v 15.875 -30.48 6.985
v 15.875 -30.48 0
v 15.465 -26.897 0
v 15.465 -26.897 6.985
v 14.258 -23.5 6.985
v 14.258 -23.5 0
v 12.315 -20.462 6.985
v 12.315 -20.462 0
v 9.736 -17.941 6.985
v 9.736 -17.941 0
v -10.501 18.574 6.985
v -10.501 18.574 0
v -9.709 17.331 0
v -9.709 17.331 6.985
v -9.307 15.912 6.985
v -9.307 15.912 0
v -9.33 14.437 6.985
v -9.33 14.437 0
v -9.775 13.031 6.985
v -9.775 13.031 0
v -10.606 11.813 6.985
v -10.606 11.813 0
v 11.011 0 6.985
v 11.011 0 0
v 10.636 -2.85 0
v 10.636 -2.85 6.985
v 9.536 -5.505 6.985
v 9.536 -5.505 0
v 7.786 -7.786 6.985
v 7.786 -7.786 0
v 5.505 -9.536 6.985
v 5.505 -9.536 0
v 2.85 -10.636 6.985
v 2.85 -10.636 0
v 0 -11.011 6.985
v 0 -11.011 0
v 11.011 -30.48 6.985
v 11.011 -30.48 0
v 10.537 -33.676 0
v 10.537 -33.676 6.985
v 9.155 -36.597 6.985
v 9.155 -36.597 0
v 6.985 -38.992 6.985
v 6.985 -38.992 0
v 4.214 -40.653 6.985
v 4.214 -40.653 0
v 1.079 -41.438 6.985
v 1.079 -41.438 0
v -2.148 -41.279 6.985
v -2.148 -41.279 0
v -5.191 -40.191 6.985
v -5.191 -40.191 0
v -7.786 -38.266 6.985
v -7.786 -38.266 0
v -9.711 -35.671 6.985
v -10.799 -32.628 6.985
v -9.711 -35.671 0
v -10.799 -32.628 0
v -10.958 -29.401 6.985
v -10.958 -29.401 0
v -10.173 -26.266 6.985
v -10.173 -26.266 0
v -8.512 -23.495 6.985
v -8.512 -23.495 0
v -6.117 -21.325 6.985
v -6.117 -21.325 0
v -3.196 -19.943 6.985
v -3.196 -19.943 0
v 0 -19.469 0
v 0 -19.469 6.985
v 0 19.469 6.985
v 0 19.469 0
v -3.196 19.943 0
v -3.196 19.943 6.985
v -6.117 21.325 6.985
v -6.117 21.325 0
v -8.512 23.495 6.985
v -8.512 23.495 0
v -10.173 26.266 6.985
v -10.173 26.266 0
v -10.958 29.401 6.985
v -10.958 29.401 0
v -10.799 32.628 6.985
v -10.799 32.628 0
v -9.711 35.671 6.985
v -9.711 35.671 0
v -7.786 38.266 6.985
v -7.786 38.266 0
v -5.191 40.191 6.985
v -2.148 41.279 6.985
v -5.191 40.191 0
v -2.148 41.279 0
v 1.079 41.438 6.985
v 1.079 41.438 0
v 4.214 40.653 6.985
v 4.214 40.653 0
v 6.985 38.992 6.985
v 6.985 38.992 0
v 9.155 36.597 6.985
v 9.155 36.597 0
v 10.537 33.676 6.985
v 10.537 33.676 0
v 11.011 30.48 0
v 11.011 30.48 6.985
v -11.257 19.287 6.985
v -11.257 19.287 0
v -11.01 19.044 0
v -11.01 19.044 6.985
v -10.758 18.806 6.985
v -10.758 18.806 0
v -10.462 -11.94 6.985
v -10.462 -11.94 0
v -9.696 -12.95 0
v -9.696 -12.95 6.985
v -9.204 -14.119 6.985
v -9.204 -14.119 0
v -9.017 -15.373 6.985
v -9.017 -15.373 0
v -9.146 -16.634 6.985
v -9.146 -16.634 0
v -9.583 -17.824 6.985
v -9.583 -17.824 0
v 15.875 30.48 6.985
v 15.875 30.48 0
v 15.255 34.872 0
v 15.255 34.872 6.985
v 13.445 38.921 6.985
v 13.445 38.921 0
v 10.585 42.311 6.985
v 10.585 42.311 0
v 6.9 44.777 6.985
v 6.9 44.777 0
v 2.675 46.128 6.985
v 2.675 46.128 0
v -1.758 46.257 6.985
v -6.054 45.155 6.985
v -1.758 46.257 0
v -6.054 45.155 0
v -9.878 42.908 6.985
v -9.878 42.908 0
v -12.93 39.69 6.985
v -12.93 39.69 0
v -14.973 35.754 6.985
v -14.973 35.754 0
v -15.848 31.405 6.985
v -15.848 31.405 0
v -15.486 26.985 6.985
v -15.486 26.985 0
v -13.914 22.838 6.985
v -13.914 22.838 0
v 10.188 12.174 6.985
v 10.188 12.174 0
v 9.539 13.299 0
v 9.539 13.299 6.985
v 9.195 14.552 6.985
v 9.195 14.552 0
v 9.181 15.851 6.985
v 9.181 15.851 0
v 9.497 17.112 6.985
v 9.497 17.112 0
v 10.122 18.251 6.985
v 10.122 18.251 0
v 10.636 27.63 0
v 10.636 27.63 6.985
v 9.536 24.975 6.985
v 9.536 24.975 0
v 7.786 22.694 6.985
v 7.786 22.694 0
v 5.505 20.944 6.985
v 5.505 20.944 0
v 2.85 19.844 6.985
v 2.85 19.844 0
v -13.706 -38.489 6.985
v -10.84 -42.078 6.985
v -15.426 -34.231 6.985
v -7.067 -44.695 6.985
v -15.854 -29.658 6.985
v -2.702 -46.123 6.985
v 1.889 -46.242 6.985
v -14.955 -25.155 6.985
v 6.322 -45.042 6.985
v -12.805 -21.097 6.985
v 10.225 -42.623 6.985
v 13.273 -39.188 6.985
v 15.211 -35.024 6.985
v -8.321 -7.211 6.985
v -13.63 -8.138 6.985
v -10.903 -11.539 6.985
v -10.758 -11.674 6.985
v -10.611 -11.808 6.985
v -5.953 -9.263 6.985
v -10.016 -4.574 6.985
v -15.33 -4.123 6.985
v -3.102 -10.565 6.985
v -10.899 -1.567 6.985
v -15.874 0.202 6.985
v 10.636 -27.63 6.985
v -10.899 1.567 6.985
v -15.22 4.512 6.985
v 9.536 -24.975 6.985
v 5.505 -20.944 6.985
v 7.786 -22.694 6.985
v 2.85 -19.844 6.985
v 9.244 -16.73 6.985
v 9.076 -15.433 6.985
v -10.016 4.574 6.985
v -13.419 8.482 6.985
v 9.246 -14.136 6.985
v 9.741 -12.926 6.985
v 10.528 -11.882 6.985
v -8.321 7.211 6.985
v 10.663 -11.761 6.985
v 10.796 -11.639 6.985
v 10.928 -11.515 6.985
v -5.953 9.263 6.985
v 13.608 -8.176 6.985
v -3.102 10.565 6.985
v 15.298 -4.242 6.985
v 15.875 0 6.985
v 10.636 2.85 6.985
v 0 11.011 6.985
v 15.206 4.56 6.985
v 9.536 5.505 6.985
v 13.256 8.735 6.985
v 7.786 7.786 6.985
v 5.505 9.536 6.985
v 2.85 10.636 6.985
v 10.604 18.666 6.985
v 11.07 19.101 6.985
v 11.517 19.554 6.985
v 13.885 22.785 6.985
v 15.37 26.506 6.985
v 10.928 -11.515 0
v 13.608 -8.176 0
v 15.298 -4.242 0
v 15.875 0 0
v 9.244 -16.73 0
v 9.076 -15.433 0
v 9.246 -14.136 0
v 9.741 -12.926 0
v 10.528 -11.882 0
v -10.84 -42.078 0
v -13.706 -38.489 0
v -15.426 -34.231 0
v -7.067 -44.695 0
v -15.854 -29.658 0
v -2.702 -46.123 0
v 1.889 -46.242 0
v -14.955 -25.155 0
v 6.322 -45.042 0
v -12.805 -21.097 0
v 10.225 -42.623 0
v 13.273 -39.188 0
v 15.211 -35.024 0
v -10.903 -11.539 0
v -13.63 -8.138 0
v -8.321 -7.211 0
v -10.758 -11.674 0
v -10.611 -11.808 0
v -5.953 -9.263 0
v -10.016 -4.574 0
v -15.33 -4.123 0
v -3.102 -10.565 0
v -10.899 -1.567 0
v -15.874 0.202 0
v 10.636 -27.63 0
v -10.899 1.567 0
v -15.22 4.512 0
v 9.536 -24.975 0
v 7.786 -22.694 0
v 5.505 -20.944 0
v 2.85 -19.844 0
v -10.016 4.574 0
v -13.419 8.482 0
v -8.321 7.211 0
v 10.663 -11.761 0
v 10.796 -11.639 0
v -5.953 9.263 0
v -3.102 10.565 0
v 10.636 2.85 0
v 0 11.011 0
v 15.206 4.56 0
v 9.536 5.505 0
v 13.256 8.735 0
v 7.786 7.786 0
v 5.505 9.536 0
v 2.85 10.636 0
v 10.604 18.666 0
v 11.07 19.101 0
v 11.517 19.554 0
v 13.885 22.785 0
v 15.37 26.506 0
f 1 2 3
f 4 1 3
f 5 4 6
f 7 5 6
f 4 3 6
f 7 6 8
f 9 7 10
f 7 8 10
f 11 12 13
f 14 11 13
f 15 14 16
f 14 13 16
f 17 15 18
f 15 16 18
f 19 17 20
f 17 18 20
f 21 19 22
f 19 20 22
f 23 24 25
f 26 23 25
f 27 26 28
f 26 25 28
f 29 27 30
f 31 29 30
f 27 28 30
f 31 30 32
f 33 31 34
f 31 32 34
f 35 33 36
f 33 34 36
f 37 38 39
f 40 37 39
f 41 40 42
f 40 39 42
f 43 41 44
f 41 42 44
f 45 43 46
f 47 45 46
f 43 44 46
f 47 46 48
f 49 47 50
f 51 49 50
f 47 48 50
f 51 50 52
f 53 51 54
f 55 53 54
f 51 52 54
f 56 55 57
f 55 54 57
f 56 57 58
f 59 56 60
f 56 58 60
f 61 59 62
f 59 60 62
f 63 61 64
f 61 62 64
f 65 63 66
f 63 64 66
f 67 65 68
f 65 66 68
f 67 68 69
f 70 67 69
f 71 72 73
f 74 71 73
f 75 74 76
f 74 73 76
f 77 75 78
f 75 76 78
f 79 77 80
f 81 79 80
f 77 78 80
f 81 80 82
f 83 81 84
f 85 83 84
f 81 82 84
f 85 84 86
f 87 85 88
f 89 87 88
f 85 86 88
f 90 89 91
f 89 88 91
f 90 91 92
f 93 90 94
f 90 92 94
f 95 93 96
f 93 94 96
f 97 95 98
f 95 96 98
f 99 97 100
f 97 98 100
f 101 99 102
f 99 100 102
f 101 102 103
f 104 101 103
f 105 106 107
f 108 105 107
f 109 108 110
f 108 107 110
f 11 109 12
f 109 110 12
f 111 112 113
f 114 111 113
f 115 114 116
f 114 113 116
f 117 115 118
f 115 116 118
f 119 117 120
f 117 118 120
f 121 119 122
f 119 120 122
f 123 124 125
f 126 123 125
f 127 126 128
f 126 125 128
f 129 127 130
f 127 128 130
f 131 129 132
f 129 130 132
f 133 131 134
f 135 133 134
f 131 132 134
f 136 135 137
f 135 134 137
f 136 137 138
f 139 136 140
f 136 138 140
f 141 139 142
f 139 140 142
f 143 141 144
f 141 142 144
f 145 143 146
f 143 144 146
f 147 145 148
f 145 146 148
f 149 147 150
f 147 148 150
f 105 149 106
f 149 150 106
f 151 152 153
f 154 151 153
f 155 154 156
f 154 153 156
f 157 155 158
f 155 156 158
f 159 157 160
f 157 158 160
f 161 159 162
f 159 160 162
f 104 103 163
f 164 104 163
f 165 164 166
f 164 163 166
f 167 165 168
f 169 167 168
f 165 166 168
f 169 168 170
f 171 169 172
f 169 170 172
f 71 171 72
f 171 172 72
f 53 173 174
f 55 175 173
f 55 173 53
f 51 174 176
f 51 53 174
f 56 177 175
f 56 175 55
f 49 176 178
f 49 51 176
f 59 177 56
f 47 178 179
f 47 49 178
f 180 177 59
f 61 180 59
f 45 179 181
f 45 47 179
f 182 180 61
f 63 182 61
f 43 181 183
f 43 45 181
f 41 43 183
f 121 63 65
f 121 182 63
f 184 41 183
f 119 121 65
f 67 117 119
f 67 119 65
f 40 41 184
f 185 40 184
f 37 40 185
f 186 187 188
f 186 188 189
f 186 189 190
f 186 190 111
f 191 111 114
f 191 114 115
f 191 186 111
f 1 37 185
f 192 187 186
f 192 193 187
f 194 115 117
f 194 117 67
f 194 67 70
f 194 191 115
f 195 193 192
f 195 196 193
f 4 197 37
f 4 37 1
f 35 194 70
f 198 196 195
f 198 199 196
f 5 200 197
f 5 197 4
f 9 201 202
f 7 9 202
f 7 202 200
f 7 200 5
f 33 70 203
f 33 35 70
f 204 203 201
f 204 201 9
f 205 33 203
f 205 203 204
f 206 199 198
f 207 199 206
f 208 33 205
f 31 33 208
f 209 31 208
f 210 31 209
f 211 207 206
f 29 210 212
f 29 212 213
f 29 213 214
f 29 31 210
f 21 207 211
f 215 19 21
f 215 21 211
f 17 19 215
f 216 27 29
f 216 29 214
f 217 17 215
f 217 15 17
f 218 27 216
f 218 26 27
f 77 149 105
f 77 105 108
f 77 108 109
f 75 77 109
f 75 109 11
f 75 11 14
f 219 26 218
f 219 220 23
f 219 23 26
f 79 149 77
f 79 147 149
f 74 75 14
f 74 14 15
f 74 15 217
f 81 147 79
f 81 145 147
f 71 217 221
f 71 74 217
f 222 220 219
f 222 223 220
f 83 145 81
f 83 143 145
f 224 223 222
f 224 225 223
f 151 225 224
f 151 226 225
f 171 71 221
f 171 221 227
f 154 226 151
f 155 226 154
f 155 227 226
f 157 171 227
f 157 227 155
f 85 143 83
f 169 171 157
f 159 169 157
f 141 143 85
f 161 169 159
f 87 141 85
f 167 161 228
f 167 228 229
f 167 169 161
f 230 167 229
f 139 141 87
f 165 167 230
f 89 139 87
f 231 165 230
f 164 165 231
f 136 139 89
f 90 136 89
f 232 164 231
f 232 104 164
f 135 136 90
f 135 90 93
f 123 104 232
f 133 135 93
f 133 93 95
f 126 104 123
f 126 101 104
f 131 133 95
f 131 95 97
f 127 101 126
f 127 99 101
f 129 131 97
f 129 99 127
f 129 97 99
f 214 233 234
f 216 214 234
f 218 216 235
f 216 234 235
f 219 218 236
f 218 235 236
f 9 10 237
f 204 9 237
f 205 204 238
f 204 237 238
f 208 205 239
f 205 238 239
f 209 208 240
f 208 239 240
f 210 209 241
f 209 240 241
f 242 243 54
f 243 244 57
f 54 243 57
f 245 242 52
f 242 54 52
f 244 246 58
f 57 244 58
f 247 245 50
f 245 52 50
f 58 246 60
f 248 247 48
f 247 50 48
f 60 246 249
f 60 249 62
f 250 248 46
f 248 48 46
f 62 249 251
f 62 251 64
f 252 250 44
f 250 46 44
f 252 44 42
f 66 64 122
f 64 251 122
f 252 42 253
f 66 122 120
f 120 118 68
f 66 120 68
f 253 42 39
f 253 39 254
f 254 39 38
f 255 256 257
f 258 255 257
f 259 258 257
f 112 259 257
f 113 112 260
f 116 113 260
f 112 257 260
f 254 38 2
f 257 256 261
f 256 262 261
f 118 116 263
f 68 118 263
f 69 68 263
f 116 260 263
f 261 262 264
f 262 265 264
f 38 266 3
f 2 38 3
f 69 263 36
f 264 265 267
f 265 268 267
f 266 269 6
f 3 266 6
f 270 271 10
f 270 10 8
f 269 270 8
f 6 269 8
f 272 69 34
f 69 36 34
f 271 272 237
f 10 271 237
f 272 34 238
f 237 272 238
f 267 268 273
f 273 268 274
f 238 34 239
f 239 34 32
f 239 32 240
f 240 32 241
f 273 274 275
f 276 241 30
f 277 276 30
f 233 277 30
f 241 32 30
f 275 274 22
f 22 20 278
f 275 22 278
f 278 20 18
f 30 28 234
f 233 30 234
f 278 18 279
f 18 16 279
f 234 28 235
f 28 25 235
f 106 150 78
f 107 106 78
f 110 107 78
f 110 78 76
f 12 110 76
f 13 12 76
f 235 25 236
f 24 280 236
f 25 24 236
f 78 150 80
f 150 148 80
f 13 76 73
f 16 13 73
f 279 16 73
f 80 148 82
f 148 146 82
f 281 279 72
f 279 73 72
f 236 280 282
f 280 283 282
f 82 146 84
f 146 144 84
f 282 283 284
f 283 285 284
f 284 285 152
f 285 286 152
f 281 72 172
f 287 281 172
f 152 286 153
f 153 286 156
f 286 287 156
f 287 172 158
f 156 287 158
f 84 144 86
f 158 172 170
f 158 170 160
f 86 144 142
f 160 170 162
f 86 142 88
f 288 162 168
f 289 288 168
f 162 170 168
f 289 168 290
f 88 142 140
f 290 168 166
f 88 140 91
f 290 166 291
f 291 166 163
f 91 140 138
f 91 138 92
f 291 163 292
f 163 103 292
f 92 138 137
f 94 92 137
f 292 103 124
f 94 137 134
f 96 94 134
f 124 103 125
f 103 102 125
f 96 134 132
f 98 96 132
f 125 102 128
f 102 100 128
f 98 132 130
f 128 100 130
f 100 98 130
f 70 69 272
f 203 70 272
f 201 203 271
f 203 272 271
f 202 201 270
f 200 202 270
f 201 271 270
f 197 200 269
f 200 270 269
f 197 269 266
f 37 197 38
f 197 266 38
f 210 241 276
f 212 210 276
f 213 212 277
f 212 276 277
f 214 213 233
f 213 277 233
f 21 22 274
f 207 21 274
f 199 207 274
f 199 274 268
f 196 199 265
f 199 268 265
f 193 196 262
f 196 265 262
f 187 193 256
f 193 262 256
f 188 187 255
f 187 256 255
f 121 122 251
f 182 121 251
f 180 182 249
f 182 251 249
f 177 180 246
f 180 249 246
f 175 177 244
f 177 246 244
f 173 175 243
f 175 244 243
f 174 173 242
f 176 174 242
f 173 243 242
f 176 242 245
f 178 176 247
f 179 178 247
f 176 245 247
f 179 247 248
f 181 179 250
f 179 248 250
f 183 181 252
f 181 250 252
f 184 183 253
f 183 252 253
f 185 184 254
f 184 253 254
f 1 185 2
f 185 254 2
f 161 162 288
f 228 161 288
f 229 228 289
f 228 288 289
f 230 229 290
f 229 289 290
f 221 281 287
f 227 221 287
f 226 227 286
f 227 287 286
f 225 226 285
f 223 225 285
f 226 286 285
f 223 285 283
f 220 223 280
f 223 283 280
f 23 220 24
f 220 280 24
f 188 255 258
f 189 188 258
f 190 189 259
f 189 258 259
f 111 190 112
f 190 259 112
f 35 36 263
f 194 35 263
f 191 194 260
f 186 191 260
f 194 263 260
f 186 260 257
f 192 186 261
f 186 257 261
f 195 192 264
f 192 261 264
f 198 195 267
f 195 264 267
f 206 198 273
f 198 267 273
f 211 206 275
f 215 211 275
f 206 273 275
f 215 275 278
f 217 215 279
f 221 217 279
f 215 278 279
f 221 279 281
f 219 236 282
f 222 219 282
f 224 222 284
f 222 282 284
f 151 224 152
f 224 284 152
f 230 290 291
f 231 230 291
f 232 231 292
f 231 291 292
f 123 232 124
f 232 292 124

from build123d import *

# Parameters (mm, degrees)
F1_DEPTH = 6.985
F2_DEPTH = 6.985


with BuildPart() as f1:
    # F0 (on Top) → F1 (new body)
    with BuildSketch(Plane.XY):
        with BuildLine():
            Line((0, 15.875), (0, 14.605))
            ThreePointArc((0, 14.605), (2.2450640303, 14.7645517881), (4.445, 15.24))
            ThreePointArc((4.445, 15.24), (2.2450640303, 15.7154482119), (0, 15.875))
        make_face()
        with BuildLine():
            ThreePointArc((-4.445, 15.24), (-2.2450640303, 14.7645517881), (0, 14.605))
            Line((0, 14.605), (0, 15.875))
            ThreePointArc((0, 15.875), (-2.2450640303, 15.7154482119), (-4.445, 15.24))
        make_face()
        with BuildLine():
            Line((0, -15.875), (0, -14.605))
            ThreePointArc((0, -14.605), (-2.2450640303, -14.7645517881), (-4.445, -15.24))
            ThreePointArc((-4.445, -15.24), (-2.2450640303, -15.7154482119), (0, -15.875))
        make_face()
        with BuildLine():
            ThreePointArc((4.445, -15.24), (2.2450640303, -14.7645517881), (0, -14.605))
            Line((0, -14.605), (0, -15.875))
            ThreePointArc((0, -15.875), (2.2450640303, -15.7154482119), (4.445, -15.24))
        make_face()
        with BuildLine():
            ThreePointArc((0, -11.0109), (-11.0109, 0), (0, 11.0109))
            Line((0, 11.0109), (0, 14.605))
            ThreePointArc((0, 14.605), (-2.2450640303, 14.7645517881), (-4.445, 15.24))
            ThreePointArc((-4.445, 15.24), (-7.7179285658, 13.8726062315), (-10.6055411699, 11.8126255123))
            ThreePointArc((-10.6055411699, 11.8126255123), (-15.8737141087, 0.2020529542), (-10.9027768874, -11.5388509455))
            ThreePointArc((-10.9027768874, -11.5388509455), (-10.6764801033, -11.7329434022), (-10.4619588639, -11.9399766219))
            ThreePointArc((-10.4619588639, -11.9399766219), (-7.6339304566, -13.919006099), (-4.445, -15.24))
            ThreePointArc((-4.445, -15.24), (-2.2450640303, -14.7645517881), (0, -14.605))
            Line((0, -14.605), (0, -11.0109))
        make_face()
        with BuildLine():
            ThreePointArc((0, 11.0109), (7.785882057, 7.785882057), (11.0109, 0))
            ThreePointArc((11.0109, 0), (7.785882057, -7.785882057), (0, -11.0109))
            Line((0, -11.0109), (0, -14.605))
            ThreePointArc((0, -14.605), (2.2450640303, -14.7645517881), (4.445, -15.24))
            ThreePointArc((4.445, -15.24), (7.6725040661, -13.897780627), (10.5280263251, -11.8817627774))
            ThreePointArc((10.5280263251, -11.8817627774), (10.7229578197, -11.6931817512), (10.9276762517, -11.5152731942))
            ThreePointArc((10.9276762517, -11.5152731942), (14.5858233483, -6.2665287242), (15.875, 0))
            ThreePointArc((15.875, 0), (14.3832859591, 6.7183859683), (10.188485352, 12.1741690161))
            ThreePointArc((10.188485352, 12.1741690161), (7.4755971863, 14.0046803501), (4.445, 15.24))
            ThreePointArc((4.445, 15.24), (2.2450640303, 14.7645517881), (0, 14.605))
            Line((0, 14.605), (0, 11.0109))
        make_face()
        with BuildLine():
            ThreePointArc((4.445, -15.24), (2.2450640303, -15.7154482119), (0, -15.875))
            ThreePointArc((0, -15.875), (-2.2450640303, -15.7154482119), (-4.445, -15.24))
            ThreePointArc((-4.445, -15.24), (-7.1320670392, -16.2972906415), (-9.5831624007, -17.823830619))
            ThreePointArc((-9.5831624007, -17.823830619), (-7.0669272633, -44.6952792465), (15.875, -30.48))
            ThreePointArc((15.875, -30.48), (14.2580065027, -23.4996794079), (9.7364329992, -17.9413598245))
            ThreePointArc((9.7364329992, -17.9413598245), (7.2182128469, -16.3409396247), (4.445, -15.24))
        make_face()
        with BuildLine():
            ThreePointArc((11.0109, -30.48), (-7.785882057, -38.265882057), (0, -19.4691))
            ThreePointArc((0, -19.4691), (7.785882057, -22.694117943), (11.0109, -30.48))
        make_face(mode=Mode.SUBTRACT)
        with BuildLine():
            ThreePointArc((-4.445, 15.24), (-2.2450640303, 15.7154482119), (0, 15.875))
            ThreePointArc((0, 15.875), (2.2450640303, 15.7154482119), (4.445, 15.24))
            ThreePointArc((4.445, 15.24), (7.4374400281, 16.4550183306), (10.1220432287, 18.2505328867))
            ThreePointArc((10.1220432287, 18.2505328867), (10.7577127256, 18.9684394589), (11.5169632943, 19.5541050033))
            ThreePointArc((11.5169632943, 19.5541050033), (14.7452944578, 24.5985107029), (15.875, 30.48))
            ThreePointArc((15.875, 30.48), (-6.0542794063, 45.1551942362), (-11.2571355427, 19.2865856695))
            ThreePointArc((-11.2571355427, 19.2865856695), (-10.8608812375, 18.9498902987), (-10.5011212887, 18.574451853))
            ThreePointArc((-10.5011212887, 18.574451853), (-7.6567798508, 16.5735501541), (-4.445, 15.24))
        make_face()
        with BuildLine():
            ThreePointArc((11.0109, 30.48), (7.785882057, 22.694117943), (0, 19.4691))
            ThreePointArc((0, 19.4691), (-7.785882057, 38.265882057), (11.0109, 30.48))
        make_face(mode=Mode.SUBTRACT)
    extrude(amount=F1_DEPTH)

    # F0 (on Top) → F2 (join)
    with BuildSketch(Plane.XY):
        with BuildLine():
            ThreePointArc((0, 11.0109), (7.785882057, 7.785882057), (11.0109, 0))
            ThreePointArc((11.0109, 0), (7.785882057, -7.785882057), (0, -11.0109))
            Line((0, -11.0109), (0, -14.605))
            ThreePointArc((0, -14.605), (2.2450640303, -14.7645517881), (4.445, -15.24))
            ThreePointArc((4.445, -15.24), (7.6725040661, -13.897780627), (10.5280263251, -11.8817627774))
            ThreePointArc((10.5280263251, -11.8817627774), (10.7229578197, -11.6931817512), (10.9276762517, -11.5152731942))
            ThreePointArc((10.9276762517, -11.5152731942), (14.5858233483, -6.2665287242), (15.875, 0))
            ThreePointArc((15.875, 0), (14.3832859591, 6.7183859683), (10.188485352, 12.1741690161))
            ThreePointArc((10.188485352, 12.1741690161), (7.4755971863, 14.0046803501), (4.445, 15.24))
            ThreePointArc((4.445, 15.24), (2.2450640303, 14.7645517881), (0, 14.605))
            Line((0, 14.605), (0, 11.0109))
        make_face()
        with BuildLine():
            ThreePointArc((0, -11.0109), (-11.0109, 0), (0, 11.0109))
            Line((0, 11.0109), (0, 14.605))
            ThreePointArc((0, 14.605), (-2.2450640303, 14.7645517881), (-4.445, 15.24))
            ThreePointArc((-4.445, 15.24), (-7.7179285658, 13.8726062315), (-10.6055411699, 11.8126255123))
            ThreePointArc((-10.6055411699, 11.8126255123), (-15.8737141087, 0.2020529542), (-10.9027768874, -11.5388509455))
            ThreePointArc((-10.9027768874, -11.5388509455), (-10.6764801033, -11.7329434022), (-10.4619588639, -11.9399766219))
            ThreePointArc((-10.4619588639, -11.9399766219), (-7.6339304566, -13.919006099), (-4.445, -15.24))
            ThreePointArc((-4.445, -15.24), (-2.2450640303, -14.7645517881), (0, -14.605))
            Line((0, -14.605), (0, -11.0109))
        make_face()
        with BuildLine():
            ThreePointArc((-4.445, 15.24), (-2.2450640303, 15.7154482119), (0, 15.875))
            ThreePointArc((0, 15.875), (2.2450640303, 15.7154482119), (4.445, 15.24))
            ThreePointArc((4.445, 15.24), (7.4374400281, 16.4550183306), (10.1220432287, 18.2505328867))
            ThreePointArc((10.1220432287, 18.2505328867), (10.7577127256, 18.9684394589), (11.5169632943, 19.5541050033))
            ThreePointArc((11.5169632943, 19.5541050033), (14.7452944578, 24.5985107029), (15.875, 30.48))
            ThreePointArc((15.875, 30.48), (-6.0542794063, 45.1551942362), (-11.2571355427, 19.2865856695))
            ThreePointArc((-11.2571355427, 19.2865856695), (-10.8608812375, 18.9498902987), (-10.5011212887, 18.574451853))
            ThreePointArc((-10.5011212887, 18.574451853), (-7.6567798508, 16.5735501541), (-4.445, 15.24))
        make_face()
        with BuildLine():
            ThreePointArc((11.0109, 30.48), (7.785882057, 22.694117943), (0, 19.4691))
            ThreePointArc((0, 19.4691), (-7.785882057, 38.265882057), (11.0109, 30.48))
        make_face(mode=Mode.SUBTRACT)
        with BuildLine():
            ThreePointArc((-10.6055411699, 11.8126255123), (-7.7179285658, 13.8726062315), (-4.445, 15.24))
            ThreePointArc((-4.445, 15.24), (-7.6567798508, 16.5735501541), (-10.5011212887, 18.574451853))
            ThreePointArc((-10.5011212887, 18.574451853), (-9.2646720581, 15.1736384914), (-10.6055411699, 11.8126255123))
        make_face()
        with BuildLine():
            ThreePointArc((10.1220432287, 18.2505328867), (7.4374400281, 16.4550183306), (4.445, 15.24))
            ThreePointArc((4.445, 15.24), (7.4755971863, 14.0046803501), (10.188485352, 12.1741690161))
            ThreePointArc((10.188485352, 12.1741690161), (9.1465341041, 15.2013209708), (10.1220432287, 18.2505328867))
        make_face()
        with BuildLine():
            ThreePointArc((4.445, -15.24), (2.2450640303, -15.7154482119), (0, -15.875))
            ThreePointArc((0, -15.875), (-2.2450640303, -15.7154482119), (-4.445, -15.24))
            ThreePointArc((-4.445, -15.24), (-7.1320670392, -16.2972906415), (-9.5831624007, -17.823830619))
            ThreePointArc((-9.5831624007, -17.823830619), (-7.0669272633, -44.6952792465), (15.875, -30.48))
            ThreePointArc((15.875, -30.48), (14.2580065027, -23.4996794079), (9.7364329992, -17.9413598245))
            ThreePointArc((9.7364329992, -17.9413598245), (7.2182128469, -16.3409396247), (4.445, -15.24))
        make_face()
        with BuildLine():
            ThreePointArc((11.0109, -30.48), (-7.785882057, -38.265882057), (0, -19.4691))
            ThreePointArc((0, -19.4691), (7.785882057, -22.694117943), (11.0109, -30.48))
        make_face(mode=Mode.SUBTRACT)
        with BuildLine():
            ThreePointArc((10.5280263251, -11.8817627774), (7.6725040661, -13.897780627), (4.445, -15.24))
            ThreePointArc((4.445, -15.24), (7.2182128469, -16.3409396247), (9.7364329992, -17.9413598245))
            ThreePointArc((9.7364329992, -17.9413598245), (9.119170131, -14.7792206259), (10.5280263251, -11.8817627774))
        make_face()
        with BuildLine():
            ThreePointArc((-9.5831624007, -17.823830619), (-7.1320670392, -16.2972906415), (-4.445, -15.24))
            ThreePointArc((-4.445, -15.24), (-7.6339304566, -13.919006099), (-10.4619588639, -11.9399766219))
            ThreePointArc((-10.4619588639, -11.9399766219), (-9.0711708687, -14.7398066276), (-9.5831624007, -17.823830619))
        make_face()
        with BuildLine():
            ThreePointArc((-11.2571355427, 19.2865856695), (-10.8849537771, 18.9243344514), (-10.5011212887, 18.574451853))
            ThreePointArc((-10.5011212887, 18.574451853), (-10.8608812375, 18.9498902987), (-11.2571355427, 19.2865856695))
        make_face()
        with BuildLine():
            ThreePointArc((11.5169632943, 19.5541050033), (10.7577127256, 18.9684394589), (10.1220432287, 18.2505328867))
            ThreePointArc((10.1220432287, 18.2505328867), (10.8391178558, 18.881329856), (11.5169632943, 19.5541050033))
        make_face()
        with BuildLine():
            ThreePointArc((10.9276762517, -11.5152731942), (10.7229578197, -11.6931817512), (10.5280263251, -11.8817627774))
            ThreePointArc((10.5280263251, -11.8817627774), (10.7294161966, -11.7002244885), (10.9276762517, -11.5152731942))
        make_face()
        with BuildLine():
            ThreePointArc((-10.9027768874, -11.5388509455), (-10.6842505064, -11.7414827052), (-10.4619588639, -11.9399766219))
            ThreePointArc((-10.4619588639, -11.9399766219), (-10.6764801033, -11.7329434022), (-10.9027768874, -11.5388509455))
        make_face()
    extrude(amount=F2_DEPTH)


solid = f1.part
